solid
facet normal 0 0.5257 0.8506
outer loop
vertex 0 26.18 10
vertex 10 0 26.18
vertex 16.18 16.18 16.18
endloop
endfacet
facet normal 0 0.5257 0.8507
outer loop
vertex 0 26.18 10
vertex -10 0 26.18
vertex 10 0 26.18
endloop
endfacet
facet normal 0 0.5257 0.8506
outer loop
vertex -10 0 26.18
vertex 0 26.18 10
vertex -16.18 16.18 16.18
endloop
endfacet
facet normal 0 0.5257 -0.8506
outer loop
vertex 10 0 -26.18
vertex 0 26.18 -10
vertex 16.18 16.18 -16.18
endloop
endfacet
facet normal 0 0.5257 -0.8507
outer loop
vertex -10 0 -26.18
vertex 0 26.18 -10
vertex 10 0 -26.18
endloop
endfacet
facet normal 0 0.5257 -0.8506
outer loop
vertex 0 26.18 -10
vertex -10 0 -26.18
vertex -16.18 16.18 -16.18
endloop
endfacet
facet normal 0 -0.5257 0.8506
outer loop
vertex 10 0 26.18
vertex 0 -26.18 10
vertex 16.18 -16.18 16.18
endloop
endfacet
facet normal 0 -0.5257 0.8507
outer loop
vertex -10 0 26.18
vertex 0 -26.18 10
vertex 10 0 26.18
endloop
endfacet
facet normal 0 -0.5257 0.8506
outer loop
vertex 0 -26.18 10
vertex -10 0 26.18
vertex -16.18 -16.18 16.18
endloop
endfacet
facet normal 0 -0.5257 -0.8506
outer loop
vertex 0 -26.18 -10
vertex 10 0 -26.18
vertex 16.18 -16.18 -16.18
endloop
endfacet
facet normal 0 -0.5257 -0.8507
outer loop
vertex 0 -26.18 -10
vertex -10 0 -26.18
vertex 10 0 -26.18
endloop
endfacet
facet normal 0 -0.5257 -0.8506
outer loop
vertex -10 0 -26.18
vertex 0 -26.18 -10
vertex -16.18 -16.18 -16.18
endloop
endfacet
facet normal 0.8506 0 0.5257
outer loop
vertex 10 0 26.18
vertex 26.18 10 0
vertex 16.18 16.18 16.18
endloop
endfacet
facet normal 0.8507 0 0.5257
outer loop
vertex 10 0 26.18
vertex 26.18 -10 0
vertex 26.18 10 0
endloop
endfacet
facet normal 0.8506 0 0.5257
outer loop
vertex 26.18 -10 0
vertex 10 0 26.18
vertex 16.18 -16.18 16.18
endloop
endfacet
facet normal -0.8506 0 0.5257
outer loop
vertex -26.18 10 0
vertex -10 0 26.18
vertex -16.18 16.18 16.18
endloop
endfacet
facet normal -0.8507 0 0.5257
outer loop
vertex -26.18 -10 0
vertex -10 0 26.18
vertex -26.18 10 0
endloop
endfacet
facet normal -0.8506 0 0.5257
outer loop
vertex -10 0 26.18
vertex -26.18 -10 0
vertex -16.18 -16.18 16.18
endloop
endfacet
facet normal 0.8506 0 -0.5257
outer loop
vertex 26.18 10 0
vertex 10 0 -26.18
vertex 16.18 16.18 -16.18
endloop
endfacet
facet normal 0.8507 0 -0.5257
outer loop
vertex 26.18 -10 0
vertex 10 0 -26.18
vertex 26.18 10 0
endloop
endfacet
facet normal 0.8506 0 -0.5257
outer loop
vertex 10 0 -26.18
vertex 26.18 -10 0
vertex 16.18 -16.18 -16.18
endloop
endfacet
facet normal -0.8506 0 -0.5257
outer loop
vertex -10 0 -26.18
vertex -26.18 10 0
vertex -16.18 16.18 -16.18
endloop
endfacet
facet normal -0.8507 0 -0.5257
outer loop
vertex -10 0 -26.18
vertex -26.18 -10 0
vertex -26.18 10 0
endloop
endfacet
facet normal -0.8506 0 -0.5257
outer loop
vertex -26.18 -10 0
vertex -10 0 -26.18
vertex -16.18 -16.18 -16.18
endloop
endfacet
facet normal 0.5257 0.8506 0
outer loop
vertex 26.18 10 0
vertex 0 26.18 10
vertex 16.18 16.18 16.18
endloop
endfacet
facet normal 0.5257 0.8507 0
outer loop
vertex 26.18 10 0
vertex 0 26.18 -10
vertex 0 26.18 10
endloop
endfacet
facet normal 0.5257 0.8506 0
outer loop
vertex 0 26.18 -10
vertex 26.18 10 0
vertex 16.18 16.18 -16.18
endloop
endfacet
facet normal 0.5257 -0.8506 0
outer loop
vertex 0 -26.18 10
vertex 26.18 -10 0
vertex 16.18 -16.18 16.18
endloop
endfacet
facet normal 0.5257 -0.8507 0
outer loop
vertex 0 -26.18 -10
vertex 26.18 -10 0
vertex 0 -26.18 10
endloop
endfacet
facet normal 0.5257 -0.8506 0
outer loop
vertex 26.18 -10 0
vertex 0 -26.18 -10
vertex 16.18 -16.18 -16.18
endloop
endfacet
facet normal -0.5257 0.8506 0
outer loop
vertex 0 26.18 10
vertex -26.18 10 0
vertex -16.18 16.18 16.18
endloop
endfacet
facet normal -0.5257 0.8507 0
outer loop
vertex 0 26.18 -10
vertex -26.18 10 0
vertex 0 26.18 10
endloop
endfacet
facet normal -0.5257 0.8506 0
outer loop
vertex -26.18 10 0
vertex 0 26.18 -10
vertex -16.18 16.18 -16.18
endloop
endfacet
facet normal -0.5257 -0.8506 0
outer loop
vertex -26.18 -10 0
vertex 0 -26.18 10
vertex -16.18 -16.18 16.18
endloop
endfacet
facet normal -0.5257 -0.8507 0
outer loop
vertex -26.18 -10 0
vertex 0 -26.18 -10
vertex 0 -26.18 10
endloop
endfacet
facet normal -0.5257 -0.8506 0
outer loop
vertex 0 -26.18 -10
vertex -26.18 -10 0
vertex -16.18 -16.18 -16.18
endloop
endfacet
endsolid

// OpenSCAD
// file: ../functions/constants.scad
/* * * * * * * * * * * * * * * * * * * * * * * * * * * * * * * * * * * * *\
 * Copyright (C) Claus Schrammel <claus@f05fk.net>                       *
 *                                                                       *
 * This program is free software: you can redistribute it and/or modify  *
 * it under the terms of the GNU General Public License as published by  *
 * the Free Software Foundation, either version 3 of the License, or     *
 * (at your option) any later version.                                   *
 *                                                                       *
 * This program is distributed in the hope that it will be useful,       *
 * but WITHOUT ANY WARRANTY; without even the implied warranty of        *
 * MERCHANTABILITY or FITNESS FOR A PARTICULAR PURPOSE.  See the         *
 * GNU General Public License for more details.                          *
 *                                                                       *
 * You should have received a copy of the GNU General Public License     *
 * along with this program.  If not, see <http://www.gnu.org/licenses/>. *
 *                                                                       *
 * SPDX-License-Identifier: GPL-3.0-or-later                             *
\* * * * * * * * * * * * * * * * * * * * * * * * * * * * * * * * * * * * */

PHI = (1 + sqrt(5)) / 2;
phi = 1 / PHI;
// main file
/* * * * * * * * * * * * * * * * * * * * * * * * * * * * * * * * * * * * *\
 * Copyright (C) Claus Schrammel <claus@f05fk.net>                       *
 *                                                                       *
 * This program is free software: you can redistribute it and/or modify  *
 * it under the terms of the GNU General Public License as published by  *
 * the Free Software Foundation, either version 3 of the License, or     *
 * (at your option) any later version.                                   *
 *                                                                       *
 * This program is distributed in the hope that it will be useful,       *
 * but WITHOUT ANY WARRANTY; without even the implied warranty of        *
 * MERCHANTABILITY or FITNESS FOR A PARTICULAR PURPOSE.  See the         *
 * GNU General Public License for more details.                          *
 *                                                                       *
 * You should have received a copy of the GNU General Public License     *
 * along with this program.  If not, see <http://www.gnu.org/licenses/>. *
 *                                                                       *
 * SPDX-License-Identifier: GPL-3.0-or-later                             *
\* * * * * * * * * * * * * * * * * * * * * * * * * * * * * * * * * * * * */

include <../functions/constants.scad>;

scale(20) DodecahedronCube();

module DodecahedronCube() {
    factor = 1 / (sqrt(5) - 1);
    polyhedron(
        points = [ [+1, +1, +1], [+1, +1, -1], [+1, -1, +1], [+1, -1, -1],
                   [-1, +1, +1], [-1, +1, -1], [-1, -1, +1], [-1, -1, -1],
                   [   0, +PHI, +phi], [   0, +PHI, -phi], [   0, -PHI, +phi], [   0, -PHI, -phi],
                   [+phi,    0, +PHI], [-phi,    0, +PHI], [+phi,    0, -PHI], [-phi,    0, -PHI],
                   [+PHI, +phi,    0], [+PHI, -phi,    0], [-PHI, +phi,    0], [-PHI, -phi,    0],
                 ] * factor,
        faces = [ [0, 12, 13, 4,  8], [ 5, 15, 14, 1,  9], [6, 13, 12, 2, 10],
                  [3, 14, 15, 7, 11], [ 0, 16, 17, 2, 12], [6, 19, 18, 4, 13],
                  [3, 17, 16, 1, 14], [ 5, 18, 19, 7, 15], [0,  8,  9, 1, 16],
                  [3, 11, 10, 2, 17], [ 5,  9,  8, 4, 18], [6, 10, 11, 7, 19],
                ],
        convexity = 2);
}
